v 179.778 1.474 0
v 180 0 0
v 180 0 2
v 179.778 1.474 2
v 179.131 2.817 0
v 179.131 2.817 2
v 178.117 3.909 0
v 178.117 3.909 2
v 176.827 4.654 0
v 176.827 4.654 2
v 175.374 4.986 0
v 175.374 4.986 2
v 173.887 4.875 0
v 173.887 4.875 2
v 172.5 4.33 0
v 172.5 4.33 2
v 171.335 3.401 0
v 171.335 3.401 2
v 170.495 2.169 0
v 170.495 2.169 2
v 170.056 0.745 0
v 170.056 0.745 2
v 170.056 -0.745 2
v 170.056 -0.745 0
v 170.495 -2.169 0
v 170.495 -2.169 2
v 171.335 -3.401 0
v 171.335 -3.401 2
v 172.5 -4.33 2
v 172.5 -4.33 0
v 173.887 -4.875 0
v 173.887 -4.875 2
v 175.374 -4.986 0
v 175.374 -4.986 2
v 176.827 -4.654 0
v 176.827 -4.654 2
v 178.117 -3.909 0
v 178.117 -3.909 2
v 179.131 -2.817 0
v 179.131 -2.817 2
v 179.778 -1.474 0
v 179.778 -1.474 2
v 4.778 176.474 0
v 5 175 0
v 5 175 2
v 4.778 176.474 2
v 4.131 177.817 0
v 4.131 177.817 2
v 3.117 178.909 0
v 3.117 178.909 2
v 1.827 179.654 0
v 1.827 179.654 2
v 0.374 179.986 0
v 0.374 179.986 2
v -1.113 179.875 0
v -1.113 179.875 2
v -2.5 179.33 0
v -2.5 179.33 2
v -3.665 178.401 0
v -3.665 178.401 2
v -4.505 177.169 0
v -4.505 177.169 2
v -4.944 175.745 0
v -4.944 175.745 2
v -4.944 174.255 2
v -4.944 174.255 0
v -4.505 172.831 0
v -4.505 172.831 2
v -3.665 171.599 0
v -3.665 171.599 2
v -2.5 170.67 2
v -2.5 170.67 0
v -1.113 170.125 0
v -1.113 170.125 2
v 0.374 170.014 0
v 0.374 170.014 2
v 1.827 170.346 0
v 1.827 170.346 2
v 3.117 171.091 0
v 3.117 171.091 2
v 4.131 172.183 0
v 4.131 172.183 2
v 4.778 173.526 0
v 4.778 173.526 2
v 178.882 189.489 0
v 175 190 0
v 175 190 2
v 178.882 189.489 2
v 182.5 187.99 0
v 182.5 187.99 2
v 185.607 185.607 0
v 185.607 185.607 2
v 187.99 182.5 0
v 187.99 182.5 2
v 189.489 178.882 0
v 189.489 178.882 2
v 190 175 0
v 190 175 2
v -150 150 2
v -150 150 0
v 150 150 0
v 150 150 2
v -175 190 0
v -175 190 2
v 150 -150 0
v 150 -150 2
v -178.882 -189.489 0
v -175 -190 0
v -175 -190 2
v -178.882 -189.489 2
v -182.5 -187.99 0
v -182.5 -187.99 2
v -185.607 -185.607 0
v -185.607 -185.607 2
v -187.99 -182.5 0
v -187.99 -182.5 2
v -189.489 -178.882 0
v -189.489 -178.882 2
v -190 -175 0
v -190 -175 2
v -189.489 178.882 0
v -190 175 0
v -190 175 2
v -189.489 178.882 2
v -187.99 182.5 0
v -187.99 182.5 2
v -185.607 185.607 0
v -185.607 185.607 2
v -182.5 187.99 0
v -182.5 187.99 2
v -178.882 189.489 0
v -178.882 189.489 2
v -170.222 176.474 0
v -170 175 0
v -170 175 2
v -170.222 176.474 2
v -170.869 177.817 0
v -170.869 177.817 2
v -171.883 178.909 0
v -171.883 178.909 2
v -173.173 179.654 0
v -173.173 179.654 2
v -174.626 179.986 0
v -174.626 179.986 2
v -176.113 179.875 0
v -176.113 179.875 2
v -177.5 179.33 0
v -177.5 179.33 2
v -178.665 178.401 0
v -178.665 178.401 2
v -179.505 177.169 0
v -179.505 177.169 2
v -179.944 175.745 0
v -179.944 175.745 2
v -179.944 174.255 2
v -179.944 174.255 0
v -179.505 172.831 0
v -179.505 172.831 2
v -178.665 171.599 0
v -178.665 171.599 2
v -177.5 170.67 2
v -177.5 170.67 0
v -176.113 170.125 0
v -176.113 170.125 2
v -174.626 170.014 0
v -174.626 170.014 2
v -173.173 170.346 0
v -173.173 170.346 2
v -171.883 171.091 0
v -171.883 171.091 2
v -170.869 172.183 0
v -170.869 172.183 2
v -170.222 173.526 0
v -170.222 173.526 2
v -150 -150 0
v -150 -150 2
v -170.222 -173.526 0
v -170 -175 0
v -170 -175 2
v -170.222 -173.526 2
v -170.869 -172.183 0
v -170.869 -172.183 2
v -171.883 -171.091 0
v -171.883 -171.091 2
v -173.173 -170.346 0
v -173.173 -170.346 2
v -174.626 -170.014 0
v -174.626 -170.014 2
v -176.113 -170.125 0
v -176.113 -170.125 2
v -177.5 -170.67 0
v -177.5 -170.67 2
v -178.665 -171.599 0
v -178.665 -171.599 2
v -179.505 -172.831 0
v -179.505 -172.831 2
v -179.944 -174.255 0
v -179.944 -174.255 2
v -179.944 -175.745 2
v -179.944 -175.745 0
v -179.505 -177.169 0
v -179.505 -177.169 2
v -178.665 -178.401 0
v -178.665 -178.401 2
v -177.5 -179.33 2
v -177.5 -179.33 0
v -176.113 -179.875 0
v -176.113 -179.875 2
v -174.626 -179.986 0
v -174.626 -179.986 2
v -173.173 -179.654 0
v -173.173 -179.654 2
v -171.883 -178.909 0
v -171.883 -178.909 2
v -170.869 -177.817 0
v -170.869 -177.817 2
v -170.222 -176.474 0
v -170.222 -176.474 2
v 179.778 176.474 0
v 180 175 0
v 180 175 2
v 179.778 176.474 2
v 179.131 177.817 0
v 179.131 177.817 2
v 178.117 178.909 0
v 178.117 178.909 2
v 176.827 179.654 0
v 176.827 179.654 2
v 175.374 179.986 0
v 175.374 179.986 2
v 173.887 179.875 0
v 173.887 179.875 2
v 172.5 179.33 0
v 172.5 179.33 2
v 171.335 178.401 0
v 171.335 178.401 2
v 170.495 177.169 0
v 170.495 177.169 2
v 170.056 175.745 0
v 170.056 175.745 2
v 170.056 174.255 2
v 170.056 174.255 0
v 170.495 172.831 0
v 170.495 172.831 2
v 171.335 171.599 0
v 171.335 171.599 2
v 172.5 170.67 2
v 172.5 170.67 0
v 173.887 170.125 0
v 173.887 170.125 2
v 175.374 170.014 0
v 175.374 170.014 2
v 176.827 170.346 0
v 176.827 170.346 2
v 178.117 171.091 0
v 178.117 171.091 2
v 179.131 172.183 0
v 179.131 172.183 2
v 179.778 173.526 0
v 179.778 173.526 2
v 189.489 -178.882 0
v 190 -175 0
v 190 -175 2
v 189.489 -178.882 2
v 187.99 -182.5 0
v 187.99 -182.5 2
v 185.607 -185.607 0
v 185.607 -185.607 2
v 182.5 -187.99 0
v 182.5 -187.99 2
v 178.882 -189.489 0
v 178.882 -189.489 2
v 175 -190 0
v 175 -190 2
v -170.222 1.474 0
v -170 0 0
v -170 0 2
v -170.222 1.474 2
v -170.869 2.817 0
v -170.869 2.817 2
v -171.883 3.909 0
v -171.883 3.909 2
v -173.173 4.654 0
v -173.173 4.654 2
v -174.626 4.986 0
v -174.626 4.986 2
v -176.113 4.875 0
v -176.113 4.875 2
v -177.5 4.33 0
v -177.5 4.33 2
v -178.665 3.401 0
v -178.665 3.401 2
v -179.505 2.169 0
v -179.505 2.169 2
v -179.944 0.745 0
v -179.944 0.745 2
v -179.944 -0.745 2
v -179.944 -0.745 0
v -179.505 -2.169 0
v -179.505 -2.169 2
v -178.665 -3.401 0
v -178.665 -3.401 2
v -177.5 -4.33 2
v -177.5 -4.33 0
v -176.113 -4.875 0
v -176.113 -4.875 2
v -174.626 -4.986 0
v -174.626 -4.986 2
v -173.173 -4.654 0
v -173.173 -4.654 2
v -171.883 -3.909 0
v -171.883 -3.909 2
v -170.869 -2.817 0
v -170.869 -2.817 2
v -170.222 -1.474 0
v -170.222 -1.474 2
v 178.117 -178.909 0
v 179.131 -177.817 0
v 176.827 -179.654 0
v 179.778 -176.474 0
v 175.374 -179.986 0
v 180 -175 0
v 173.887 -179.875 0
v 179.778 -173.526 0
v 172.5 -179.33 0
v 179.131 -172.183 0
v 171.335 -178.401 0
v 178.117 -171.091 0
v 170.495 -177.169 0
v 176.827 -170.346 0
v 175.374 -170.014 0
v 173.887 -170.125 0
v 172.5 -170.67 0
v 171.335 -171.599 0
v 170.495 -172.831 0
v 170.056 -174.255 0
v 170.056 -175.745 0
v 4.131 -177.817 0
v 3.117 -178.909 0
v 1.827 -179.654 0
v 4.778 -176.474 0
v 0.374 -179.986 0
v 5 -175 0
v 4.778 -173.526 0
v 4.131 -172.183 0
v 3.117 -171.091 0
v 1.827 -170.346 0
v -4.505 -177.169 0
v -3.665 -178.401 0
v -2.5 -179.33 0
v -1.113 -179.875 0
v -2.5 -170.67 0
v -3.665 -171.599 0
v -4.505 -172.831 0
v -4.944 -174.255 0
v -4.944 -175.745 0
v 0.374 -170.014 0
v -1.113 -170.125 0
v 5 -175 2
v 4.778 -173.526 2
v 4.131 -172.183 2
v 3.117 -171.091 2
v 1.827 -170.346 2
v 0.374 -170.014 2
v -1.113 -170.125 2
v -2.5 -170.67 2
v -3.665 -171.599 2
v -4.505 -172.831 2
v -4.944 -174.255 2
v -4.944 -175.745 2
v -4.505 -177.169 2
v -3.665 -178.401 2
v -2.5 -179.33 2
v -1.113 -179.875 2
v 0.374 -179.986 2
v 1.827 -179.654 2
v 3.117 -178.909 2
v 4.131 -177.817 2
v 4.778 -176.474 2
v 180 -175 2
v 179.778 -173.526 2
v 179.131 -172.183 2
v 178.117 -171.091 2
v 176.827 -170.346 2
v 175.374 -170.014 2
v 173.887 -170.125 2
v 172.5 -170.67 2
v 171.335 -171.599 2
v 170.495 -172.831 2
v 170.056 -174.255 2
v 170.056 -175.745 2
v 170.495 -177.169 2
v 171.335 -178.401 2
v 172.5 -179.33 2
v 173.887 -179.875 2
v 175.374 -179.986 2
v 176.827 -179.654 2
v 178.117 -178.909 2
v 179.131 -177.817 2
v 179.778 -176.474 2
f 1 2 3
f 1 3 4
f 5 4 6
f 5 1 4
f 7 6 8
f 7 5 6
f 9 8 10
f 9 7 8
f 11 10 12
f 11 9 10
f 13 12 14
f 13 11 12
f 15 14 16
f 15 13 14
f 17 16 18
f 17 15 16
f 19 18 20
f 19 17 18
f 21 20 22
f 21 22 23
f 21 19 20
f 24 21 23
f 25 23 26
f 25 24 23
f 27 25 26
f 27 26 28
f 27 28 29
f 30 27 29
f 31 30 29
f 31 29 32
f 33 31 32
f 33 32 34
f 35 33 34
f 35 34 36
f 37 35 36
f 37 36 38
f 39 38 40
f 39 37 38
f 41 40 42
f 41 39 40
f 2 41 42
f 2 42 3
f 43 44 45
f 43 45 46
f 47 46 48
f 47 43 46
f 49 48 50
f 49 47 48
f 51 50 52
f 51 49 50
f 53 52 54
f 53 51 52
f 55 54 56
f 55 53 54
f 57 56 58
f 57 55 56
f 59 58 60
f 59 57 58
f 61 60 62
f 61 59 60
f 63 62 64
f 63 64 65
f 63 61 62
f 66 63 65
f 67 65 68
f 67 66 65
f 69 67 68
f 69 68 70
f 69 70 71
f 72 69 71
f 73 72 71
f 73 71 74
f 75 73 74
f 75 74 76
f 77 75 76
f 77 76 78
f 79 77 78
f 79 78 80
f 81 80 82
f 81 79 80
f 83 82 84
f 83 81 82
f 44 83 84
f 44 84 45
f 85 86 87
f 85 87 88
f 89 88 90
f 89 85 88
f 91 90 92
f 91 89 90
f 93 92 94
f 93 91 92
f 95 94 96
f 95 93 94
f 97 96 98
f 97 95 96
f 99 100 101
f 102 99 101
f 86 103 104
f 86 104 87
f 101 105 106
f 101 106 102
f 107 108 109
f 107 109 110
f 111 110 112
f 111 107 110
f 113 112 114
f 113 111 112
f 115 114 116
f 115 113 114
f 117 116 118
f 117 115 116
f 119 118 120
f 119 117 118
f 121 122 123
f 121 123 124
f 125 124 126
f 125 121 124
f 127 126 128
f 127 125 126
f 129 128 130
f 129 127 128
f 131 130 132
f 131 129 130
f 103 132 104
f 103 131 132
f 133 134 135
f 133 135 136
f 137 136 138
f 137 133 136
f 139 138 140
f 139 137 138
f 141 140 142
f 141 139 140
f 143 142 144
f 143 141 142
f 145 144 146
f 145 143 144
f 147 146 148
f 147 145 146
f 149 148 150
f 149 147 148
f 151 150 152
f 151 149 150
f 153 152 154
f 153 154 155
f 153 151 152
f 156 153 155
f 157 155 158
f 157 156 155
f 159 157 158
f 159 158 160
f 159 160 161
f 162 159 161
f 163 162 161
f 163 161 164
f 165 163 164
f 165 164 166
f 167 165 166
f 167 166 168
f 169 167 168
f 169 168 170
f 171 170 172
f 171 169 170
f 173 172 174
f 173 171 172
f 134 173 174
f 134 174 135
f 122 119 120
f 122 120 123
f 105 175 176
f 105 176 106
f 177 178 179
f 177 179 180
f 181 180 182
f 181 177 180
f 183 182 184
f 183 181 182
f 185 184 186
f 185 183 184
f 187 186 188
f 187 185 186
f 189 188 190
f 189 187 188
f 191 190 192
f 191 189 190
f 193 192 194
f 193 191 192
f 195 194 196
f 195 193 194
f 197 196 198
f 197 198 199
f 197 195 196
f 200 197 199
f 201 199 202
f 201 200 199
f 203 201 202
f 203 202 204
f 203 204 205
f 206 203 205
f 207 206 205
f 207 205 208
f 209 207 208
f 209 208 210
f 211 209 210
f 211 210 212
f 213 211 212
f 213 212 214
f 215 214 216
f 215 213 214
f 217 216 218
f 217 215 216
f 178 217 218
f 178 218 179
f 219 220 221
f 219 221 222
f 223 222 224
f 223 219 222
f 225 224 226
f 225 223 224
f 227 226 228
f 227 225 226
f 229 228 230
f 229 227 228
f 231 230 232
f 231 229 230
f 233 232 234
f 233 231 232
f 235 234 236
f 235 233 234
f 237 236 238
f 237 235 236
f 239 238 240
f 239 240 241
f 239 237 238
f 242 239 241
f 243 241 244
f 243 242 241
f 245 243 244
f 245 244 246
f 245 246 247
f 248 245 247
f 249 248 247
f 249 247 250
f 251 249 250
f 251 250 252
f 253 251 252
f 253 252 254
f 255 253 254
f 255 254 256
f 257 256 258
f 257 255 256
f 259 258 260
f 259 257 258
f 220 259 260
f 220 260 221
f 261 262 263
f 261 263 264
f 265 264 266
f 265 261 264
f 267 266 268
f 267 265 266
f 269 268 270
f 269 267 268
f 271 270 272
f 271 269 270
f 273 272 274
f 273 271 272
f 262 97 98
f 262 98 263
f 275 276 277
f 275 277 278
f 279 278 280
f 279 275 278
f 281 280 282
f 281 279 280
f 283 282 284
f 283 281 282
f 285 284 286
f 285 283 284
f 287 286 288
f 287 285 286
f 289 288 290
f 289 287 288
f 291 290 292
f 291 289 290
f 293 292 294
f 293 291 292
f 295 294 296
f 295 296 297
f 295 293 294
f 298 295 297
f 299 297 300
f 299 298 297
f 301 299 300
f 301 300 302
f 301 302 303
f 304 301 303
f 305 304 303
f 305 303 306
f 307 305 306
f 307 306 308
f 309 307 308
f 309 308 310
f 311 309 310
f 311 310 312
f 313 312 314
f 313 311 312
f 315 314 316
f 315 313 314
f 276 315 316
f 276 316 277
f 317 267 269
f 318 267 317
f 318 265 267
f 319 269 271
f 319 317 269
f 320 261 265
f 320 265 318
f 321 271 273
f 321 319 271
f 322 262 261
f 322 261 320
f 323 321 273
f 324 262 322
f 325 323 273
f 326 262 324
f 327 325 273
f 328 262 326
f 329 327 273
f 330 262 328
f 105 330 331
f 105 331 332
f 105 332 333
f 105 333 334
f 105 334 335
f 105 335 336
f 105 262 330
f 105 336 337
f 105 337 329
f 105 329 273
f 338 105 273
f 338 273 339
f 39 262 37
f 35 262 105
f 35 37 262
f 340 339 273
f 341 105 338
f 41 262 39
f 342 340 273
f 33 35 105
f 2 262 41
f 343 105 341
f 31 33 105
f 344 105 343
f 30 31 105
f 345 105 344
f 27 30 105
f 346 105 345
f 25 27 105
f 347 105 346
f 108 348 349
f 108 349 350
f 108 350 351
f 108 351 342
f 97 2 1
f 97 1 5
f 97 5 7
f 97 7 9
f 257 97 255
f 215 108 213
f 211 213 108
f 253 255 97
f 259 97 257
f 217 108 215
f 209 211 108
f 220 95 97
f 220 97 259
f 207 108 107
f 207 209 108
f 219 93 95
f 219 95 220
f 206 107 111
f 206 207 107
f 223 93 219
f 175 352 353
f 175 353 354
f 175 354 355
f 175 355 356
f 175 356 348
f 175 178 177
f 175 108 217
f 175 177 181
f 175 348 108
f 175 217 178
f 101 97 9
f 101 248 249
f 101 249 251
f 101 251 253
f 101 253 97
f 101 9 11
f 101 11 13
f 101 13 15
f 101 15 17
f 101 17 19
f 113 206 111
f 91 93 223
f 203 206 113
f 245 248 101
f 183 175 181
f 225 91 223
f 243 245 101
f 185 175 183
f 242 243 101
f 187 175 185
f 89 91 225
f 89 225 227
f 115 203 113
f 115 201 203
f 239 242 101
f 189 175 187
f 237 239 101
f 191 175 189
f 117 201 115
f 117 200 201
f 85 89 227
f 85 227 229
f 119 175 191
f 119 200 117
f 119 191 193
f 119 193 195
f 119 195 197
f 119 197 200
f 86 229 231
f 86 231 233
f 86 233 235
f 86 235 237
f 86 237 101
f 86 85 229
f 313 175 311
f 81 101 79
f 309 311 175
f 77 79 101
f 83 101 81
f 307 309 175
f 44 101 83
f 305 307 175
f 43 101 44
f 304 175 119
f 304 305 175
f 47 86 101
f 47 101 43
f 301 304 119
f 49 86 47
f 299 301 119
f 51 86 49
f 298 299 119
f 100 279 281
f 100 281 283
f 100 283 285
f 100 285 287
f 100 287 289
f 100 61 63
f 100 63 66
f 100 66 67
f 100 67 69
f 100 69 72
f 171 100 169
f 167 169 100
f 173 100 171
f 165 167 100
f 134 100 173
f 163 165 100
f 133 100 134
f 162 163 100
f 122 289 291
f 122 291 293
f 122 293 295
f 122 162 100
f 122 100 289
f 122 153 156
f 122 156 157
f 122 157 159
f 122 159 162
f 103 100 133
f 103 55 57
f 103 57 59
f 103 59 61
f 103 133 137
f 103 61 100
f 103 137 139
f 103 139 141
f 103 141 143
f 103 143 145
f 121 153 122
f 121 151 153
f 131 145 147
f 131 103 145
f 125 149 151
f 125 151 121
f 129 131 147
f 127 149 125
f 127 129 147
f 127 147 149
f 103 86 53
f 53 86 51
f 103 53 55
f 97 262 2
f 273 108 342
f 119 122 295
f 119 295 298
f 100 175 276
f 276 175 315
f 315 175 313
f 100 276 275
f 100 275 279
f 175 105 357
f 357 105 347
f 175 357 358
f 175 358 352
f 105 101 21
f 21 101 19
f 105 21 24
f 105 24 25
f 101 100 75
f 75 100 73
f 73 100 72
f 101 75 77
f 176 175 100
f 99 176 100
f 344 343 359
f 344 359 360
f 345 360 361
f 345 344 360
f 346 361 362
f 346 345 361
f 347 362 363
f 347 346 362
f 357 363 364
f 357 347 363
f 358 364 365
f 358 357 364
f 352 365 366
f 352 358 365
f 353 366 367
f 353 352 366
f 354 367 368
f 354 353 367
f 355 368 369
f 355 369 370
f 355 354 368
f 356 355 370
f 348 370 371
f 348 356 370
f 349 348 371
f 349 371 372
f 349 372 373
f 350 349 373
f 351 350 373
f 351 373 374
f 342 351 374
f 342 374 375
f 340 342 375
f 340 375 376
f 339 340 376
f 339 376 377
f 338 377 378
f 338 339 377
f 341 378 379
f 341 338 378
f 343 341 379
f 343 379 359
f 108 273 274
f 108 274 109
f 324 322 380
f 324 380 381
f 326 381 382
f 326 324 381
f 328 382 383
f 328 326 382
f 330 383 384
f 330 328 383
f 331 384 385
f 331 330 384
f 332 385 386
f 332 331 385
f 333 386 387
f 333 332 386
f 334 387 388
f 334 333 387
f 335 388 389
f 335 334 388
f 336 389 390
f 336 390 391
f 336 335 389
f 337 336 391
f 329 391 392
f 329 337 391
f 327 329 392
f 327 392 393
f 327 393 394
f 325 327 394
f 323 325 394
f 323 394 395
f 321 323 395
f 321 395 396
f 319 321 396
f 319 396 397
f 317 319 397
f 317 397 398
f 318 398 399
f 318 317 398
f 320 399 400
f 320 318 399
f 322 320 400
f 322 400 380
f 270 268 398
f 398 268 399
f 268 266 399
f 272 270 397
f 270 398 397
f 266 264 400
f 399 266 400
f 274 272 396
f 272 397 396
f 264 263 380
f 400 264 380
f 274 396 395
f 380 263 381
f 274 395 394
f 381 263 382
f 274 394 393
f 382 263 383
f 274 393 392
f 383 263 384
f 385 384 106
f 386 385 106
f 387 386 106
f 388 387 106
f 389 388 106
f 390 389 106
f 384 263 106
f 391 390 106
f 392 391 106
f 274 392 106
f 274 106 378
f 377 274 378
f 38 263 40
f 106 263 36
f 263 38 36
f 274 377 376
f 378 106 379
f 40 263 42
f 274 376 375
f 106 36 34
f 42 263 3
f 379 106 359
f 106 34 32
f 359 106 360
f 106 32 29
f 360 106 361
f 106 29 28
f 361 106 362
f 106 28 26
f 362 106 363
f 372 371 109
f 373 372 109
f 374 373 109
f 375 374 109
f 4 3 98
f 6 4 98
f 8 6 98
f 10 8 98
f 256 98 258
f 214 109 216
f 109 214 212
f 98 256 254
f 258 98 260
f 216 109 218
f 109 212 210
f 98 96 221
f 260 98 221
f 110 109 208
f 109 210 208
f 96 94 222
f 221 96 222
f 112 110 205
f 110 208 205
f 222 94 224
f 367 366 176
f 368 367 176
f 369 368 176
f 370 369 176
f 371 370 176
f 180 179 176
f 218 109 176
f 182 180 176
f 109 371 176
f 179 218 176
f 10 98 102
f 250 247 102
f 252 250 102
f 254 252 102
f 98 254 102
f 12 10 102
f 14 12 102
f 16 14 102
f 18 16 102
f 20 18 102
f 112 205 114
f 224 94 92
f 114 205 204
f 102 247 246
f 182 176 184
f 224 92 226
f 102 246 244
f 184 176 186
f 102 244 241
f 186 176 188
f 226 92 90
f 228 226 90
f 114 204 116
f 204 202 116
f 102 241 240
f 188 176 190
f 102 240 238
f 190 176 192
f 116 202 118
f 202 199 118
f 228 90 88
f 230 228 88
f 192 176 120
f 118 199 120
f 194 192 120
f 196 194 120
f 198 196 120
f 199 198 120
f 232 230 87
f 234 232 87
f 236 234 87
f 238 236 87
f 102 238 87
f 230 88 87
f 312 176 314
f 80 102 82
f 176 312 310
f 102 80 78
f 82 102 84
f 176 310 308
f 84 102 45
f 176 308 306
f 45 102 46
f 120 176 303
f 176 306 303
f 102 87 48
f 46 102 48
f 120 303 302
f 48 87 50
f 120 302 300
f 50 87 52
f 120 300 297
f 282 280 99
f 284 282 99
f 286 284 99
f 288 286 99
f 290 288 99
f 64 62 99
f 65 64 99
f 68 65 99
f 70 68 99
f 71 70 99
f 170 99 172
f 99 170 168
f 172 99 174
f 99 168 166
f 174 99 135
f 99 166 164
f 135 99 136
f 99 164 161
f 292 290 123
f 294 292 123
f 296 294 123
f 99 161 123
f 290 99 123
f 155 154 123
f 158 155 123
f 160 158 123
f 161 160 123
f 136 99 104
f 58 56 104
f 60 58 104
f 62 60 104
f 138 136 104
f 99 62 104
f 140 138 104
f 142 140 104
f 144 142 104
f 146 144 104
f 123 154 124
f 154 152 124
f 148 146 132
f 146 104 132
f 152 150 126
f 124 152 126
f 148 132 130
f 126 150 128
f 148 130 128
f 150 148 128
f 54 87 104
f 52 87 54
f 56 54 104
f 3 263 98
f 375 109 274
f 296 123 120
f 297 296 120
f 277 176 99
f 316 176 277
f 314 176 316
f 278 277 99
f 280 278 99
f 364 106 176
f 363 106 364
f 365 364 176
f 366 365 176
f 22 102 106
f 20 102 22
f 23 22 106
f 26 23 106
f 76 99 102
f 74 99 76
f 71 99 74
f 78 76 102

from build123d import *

# Parameters (mm, degrees)
SKETCH2_R           = 5
SKETCH2_W           = 300
SKETCH2_H           = 300
BOSS_EXTRUDE1_DEPTH = 2


with BuildPart() as part:
    # Sketch2 → Boss-Extrude1 (new body)
    with BuildSketch(Plane.XY):
        with BuildLine():
            Line((-175, 190), (175, 190))
            ThreePointArc((175, 190), (185.606601718, 185.606601718), (190, 175))
            Line((190, 175), (190, -175))
            ThreePointArc((190, -175), (185.606601718, -185.606601718), (175, -190))
            Line((175, -190), (-175, -190))
            ThreePointArc((-175, -190), (-185.606601718, -185.606601718), (-190, -175))
            Line((-190, -175), (-190, 175))
            ThreePointArc((-190, 175), (-185.606601718, 185.606601718), (-175, 190))
        make_face()
        with Locations((-175, 175)):
            Circle(SKETCH2_R, mode=Mode.SUBTRACT)
        with Locations((0, 175)):
            Circle(SKETCH2_R, mode=Mode.SUBTRACT)
        with Locations((175, 175)):
            Circle(SKETCH2_R, mode=Mode.SUBTRACT)
        with Locations((175, 0)):
            Circle(SKETCH2_R, mode=Mode.SUBTRACT)
        with Locations((-175, 0)):
            Circle(SKETCH2_R, mode=Mode.SUBTRACT)
        with Locations((-175, -175)):
            Circle(SKETCH2_R, mode=Mode.SUBTRACT)
        with Locations((0, -175)):
            Circle(SKETCH2_R, mode=Mode.SUBTRACT)
        with Locations((175, -175)):
            Circle(SKETCH2_R, mode=Mode.SUBTRACT)
        Rectangle(SKETCH2_W, SKETCH2_H, mode=Mode.SUBTRACT)
    extrude(amount=BOSS_EXTRUDE1_DEPTH)


solid = part.part
